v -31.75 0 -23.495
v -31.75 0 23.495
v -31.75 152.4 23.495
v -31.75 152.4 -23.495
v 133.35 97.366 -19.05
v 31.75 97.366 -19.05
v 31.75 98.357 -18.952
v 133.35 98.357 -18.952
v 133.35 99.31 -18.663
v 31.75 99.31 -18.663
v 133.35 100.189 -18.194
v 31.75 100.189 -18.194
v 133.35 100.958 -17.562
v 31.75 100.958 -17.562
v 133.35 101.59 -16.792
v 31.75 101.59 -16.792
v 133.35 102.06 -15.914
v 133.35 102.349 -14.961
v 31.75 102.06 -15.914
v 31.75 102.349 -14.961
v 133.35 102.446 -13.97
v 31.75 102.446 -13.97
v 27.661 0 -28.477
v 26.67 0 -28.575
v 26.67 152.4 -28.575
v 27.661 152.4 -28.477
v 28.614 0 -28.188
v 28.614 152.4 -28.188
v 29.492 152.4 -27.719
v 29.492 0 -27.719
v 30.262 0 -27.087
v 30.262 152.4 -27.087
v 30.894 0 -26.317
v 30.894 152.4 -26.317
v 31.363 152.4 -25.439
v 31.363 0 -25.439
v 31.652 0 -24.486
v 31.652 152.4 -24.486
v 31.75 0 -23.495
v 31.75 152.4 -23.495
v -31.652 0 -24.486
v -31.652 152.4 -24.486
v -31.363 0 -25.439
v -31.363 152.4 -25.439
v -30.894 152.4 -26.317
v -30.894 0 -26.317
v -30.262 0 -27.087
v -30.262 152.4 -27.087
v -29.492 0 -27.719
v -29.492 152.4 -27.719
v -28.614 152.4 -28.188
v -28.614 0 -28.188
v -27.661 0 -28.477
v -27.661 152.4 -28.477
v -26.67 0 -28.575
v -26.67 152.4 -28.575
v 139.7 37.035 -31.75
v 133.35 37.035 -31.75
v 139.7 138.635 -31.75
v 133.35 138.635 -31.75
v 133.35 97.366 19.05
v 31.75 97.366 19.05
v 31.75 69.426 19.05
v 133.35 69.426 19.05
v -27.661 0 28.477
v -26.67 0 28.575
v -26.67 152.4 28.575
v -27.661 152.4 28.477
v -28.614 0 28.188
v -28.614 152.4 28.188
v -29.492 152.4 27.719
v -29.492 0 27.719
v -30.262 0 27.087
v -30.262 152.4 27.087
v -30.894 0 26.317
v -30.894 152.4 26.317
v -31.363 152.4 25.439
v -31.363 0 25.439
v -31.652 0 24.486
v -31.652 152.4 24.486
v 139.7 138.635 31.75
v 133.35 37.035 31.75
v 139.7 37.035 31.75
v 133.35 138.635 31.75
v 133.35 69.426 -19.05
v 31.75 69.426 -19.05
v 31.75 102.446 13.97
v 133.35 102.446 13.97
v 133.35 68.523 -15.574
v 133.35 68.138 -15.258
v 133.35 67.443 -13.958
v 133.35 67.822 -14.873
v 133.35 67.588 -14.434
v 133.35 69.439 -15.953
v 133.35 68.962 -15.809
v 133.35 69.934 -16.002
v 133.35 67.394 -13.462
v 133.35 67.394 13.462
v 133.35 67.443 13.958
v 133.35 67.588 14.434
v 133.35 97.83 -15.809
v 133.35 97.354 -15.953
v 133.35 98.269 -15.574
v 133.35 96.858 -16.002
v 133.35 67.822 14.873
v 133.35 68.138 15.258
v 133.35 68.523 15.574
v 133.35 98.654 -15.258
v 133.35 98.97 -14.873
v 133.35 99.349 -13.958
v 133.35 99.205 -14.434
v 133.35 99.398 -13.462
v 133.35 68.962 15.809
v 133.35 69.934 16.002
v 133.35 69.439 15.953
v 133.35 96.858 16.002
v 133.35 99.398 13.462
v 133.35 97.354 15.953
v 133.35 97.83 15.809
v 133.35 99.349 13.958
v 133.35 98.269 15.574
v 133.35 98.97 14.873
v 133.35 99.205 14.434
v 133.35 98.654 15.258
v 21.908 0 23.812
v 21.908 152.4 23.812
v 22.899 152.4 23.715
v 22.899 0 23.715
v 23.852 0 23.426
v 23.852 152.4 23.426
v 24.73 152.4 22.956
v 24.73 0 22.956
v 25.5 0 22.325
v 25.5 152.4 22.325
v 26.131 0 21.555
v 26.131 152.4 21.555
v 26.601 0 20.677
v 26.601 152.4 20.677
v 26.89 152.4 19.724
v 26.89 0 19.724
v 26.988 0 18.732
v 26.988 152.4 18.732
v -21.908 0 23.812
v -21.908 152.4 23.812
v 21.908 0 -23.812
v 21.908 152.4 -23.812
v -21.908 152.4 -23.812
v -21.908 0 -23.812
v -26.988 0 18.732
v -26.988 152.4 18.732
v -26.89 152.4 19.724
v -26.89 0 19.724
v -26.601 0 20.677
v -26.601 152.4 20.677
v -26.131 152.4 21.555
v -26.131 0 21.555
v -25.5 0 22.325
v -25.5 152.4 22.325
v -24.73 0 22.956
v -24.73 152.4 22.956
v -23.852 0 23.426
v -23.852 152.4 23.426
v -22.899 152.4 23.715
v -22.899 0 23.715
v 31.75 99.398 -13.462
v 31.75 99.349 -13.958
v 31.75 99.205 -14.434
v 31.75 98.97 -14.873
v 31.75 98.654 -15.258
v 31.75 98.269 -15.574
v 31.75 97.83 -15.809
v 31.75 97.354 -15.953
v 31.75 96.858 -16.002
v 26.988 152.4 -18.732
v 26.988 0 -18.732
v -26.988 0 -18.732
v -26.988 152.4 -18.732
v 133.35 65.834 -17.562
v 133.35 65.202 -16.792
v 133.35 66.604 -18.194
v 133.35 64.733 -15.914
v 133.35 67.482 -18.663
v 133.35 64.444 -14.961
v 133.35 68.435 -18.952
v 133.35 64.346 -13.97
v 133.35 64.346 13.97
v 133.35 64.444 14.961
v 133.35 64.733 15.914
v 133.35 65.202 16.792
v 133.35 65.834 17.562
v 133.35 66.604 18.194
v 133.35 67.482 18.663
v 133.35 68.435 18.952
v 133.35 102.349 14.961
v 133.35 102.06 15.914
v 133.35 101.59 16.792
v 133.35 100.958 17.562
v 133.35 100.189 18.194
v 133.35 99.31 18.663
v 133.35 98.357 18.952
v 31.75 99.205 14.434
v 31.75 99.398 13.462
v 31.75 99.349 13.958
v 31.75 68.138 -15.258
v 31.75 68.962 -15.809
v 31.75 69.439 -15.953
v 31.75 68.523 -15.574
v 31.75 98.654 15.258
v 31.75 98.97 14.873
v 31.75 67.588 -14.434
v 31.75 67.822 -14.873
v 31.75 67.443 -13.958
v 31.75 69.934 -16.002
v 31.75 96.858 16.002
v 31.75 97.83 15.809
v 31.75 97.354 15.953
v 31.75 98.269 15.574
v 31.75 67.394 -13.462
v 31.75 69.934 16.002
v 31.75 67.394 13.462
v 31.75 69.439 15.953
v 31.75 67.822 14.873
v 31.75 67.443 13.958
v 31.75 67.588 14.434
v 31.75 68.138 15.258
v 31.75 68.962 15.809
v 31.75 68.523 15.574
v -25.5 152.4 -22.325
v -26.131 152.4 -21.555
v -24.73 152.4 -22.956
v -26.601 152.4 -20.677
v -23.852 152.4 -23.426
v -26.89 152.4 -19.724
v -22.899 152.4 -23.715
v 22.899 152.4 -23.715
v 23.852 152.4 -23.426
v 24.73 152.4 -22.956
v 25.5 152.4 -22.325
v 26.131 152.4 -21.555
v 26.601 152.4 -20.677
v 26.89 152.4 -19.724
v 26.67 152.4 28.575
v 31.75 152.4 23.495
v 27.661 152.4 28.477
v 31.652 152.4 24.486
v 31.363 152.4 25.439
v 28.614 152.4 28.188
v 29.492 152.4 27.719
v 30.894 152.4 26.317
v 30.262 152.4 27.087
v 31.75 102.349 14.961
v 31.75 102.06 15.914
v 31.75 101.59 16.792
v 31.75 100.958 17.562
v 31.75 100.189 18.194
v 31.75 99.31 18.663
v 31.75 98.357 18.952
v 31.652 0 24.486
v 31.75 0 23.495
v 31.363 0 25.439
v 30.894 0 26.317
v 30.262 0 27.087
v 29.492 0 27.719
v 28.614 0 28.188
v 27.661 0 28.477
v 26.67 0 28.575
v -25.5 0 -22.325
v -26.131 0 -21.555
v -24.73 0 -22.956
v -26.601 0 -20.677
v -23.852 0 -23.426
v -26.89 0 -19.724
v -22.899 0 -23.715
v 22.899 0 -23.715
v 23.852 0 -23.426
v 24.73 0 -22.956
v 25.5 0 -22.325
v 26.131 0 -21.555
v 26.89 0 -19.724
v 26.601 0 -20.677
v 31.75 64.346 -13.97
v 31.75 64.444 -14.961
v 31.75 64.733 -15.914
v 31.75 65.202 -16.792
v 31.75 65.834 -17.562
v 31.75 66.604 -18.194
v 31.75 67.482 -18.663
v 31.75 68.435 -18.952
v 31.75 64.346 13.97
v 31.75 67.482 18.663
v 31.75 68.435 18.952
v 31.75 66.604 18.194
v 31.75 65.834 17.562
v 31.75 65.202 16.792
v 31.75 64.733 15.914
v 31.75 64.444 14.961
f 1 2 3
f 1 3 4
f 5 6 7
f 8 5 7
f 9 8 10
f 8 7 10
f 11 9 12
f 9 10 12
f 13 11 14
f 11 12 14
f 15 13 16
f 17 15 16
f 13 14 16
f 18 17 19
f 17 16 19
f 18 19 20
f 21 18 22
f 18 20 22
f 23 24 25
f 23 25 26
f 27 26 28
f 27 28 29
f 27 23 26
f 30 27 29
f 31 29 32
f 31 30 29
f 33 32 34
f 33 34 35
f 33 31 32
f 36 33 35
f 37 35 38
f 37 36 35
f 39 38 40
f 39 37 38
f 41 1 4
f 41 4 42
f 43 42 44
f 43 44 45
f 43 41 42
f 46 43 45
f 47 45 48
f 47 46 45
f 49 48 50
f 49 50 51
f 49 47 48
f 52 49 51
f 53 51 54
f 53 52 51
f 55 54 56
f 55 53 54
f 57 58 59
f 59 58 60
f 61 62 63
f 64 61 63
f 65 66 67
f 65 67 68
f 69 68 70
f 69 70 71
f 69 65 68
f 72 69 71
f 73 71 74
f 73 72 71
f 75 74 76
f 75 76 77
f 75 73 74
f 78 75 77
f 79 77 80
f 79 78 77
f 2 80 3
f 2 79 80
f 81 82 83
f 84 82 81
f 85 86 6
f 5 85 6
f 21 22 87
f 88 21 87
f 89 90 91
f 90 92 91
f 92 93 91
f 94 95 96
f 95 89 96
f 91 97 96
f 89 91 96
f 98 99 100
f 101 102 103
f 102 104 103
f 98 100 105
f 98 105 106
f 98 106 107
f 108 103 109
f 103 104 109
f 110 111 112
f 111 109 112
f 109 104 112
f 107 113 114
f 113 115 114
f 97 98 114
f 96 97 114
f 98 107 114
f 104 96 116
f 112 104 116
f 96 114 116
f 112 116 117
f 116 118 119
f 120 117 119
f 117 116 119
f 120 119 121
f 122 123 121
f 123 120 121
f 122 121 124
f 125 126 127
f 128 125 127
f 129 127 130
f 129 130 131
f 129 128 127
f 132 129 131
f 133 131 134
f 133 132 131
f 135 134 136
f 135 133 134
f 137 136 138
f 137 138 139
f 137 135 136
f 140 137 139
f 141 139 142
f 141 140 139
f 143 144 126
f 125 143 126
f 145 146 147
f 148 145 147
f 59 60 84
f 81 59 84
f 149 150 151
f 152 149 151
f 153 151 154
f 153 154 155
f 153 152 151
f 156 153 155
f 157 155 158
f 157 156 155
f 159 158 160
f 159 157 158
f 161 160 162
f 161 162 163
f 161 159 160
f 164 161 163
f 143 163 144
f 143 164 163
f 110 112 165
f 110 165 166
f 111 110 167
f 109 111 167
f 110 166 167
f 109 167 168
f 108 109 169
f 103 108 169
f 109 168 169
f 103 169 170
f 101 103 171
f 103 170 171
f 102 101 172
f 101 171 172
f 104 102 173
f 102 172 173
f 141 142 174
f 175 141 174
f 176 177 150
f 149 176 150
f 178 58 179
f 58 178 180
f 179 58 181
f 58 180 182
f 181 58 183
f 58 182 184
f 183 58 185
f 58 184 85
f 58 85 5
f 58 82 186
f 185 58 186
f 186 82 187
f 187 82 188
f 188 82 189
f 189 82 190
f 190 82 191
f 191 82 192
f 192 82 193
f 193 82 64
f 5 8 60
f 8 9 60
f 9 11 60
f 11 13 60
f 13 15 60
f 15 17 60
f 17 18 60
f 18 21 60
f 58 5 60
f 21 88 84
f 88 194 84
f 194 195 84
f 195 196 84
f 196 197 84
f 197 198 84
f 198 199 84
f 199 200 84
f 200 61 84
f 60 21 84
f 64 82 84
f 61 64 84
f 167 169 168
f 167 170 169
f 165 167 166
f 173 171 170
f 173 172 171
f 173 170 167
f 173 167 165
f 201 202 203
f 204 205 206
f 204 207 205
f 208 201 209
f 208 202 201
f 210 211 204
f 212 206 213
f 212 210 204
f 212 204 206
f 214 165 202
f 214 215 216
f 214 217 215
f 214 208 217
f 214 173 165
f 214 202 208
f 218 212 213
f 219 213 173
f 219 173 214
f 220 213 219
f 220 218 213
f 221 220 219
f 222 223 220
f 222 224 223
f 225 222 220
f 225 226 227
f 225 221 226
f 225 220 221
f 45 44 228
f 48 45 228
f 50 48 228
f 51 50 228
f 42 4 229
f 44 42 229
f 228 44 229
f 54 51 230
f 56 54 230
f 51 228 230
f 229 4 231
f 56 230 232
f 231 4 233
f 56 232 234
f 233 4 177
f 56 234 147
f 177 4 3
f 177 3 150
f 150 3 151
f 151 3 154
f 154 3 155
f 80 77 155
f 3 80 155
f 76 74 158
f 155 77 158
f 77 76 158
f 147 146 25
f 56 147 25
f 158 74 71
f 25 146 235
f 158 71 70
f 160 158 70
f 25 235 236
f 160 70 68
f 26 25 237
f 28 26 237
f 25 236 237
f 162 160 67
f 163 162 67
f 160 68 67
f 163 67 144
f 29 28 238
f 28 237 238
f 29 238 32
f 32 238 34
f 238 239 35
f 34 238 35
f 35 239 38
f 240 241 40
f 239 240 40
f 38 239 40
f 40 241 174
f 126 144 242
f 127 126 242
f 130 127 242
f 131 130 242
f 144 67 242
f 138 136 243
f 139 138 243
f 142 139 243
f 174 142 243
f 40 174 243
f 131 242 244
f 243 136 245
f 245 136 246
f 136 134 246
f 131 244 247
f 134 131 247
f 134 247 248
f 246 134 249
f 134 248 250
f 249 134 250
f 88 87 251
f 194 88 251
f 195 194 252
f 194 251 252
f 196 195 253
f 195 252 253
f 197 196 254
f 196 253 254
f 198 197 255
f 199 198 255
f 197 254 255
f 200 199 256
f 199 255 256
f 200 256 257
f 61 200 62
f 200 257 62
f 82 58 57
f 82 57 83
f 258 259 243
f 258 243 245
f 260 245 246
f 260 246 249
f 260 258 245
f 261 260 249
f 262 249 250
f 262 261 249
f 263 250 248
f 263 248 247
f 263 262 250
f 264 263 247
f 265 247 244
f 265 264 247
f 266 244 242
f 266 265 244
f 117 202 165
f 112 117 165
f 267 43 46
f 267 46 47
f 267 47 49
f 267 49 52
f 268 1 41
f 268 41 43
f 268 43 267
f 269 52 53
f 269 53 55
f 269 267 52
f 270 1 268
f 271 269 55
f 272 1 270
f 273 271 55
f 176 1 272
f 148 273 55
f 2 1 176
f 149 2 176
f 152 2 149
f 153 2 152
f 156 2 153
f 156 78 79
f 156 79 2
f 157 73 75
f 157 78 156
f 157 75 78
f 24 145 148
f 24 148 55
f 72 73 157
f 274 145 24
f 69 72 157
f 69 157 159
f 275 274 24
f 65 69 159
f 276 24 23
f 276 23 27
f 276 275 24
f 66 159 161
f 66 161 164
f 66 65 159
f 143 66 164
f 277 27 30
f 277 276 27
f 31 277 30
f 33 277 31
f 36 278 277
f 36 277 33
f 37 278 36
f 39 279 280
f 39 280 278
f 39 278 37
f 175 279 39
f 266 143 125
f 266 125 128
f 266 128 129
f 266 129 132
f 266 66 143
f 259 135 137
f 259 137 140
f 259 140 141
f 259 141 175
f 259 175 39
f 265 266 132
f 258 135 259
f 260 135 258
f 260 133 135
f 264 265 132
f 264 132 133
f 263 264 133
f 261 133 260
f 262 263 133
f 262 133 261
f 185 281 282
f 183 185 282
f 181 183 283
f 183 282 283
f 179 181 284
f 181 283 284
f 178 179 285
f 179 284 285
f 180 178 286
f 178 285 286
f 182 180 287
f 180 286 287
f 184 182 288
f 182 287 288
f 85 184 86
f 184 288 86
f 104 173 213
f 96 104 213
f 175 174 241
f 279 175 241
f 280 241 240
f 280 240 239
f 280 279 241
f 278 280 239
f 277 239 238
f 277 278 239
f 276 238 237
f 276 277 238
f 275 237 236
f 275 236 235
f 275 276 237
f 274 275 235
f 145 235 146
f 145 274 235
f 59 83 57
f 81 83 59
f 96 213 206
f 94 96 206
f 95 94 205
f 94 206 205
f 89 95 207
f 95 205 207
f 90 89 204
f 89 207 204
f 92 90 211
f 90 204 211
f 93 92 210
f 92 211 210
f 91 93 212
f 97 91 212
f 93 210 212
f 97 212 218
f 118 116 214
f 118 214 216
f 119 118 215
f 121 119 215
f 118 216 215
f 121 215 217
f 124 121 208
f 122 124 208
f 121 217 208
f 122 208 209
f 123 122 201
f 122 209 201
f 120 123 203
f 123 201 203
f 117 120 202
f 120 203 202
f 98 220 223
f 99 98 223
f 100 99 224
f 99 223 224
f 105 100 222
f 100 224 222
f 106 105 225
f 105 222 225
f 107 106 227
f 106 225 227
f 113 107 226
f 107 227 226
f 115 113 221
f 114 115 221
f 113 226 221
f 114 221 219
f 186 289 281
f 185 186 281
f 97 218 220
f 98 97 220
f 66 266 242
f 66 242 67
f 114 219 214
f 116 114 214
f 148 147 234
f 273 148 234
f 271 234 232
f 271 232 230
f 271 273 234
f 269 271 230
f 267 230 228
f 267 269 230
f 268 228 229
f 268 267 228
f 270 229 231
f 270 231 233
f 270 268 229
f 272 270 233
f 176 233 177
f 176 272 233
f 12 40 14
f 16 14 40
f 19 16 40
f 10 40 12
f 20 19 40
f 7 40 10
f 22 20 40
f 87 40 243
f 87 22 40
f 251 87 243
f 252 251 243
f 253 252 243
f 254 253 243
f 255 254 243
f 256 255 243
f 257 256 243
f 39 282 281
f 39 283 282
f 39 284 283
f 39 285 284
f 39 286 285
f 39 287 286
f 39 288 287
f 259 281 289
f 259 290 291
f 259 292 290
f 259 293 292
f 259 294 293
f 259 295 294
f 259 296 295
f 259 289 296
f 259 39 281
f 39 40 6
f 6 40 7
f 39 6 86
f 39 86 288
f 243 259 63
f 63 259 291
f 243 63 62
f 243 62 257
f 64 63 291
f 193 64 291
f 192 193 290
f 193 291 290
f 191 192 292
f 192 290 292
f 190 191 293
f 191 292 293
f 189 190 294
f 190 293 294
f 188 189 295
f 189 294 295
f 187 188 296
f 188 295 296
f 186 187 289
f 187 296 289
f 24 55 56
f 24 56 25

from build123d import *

# Parameters (mm, degrees)
F1_DEPTH = 152.4
F3_DEPTH = 101.6
F5_W     = 101.6
F5_H     = 63.5
F6_DEPTH = 6.35


with BuildPart() as f1:
    # F0 (on Front) → F1 (new body)
    with BuildSketch(Plane.XZ):
        with BuildLine():
            Line((-26.67, -28.575), (26.67, -28.575))
            ThreePointArc((26.67, -28.575), (30.2621024484, -27.0871024484), (31.75, -23.495))
            Line((31.75, -23.495), (31.75, 23.495))
            ThreePointArc((31.75, 23.495), (30.2621024484, 27.0871024484), (26.67, 28.575))
            Line((26.67, 28.575), (-26.67, 28.575))
            ThreePointArc((-26.67, 28.575), (-30.2621024484, 27.0871024484), (-31.75, 23.495))
            Line((-31.75, 23.495), (-31.75, -23.495))
            ThreePointArc((-31.75, -23.495), (-30.2621024484, -27.0871024484), (-26.67, -28.575))
        make_face()
        with BuildLine():
            Line((-21.9075, 23.8125), (21.9075, 23.8125))
            ThreePointArc((21.9075, 23.8125), (25.4996024484, 22.3246024484), (26.9875, 18.7325))
            Line((26.9875, 18.7325), (26.9875, -18.7325))
            ThreePointArc((26.9875, -18.7325), (25.4996024484, -22.3246024484), (21.9075, -23.8125))
            Line((21.9075, -23.8125), (-21.9075, -23.8125))
            ThreePointArc((-21.9075, -23.8125), (-25.4996024484, -22.3246024484), (-26.9875, -18.7325))
            Line((-26.9875, -18.7325), (-26.9875, 18.7325))
            ThreePointArc((-26.9875, 18.7325), (-25.4996024484, 22.3246024484), (-21.9075, 23.8125))
        make_face(mode=Mode.SUBTRACT)
    extrude(amount=-F1_DEPTH)

    # F2 (on face) → F3 (join)
    with BuildSketch(Plane.YZ.offset(31.75)):
        with BuildLine():
            Line((69.4262681528, -19.05), (97.3662681528, -19.05))
            ThreePointArc((97.3662681528, -19.05), (100.9583706013, -17.5621024484), (102.4462681528, -13.97))
            Line((102.4462681528, -13.97), (102.4462681528, 13.97))
            ThreePointArc((102.4462681528, 13.97), (100.9583706013, 17.5621024484), (97.3662681528, 19.05))
            Line((97.3662681528, 19.05), (69.4262681528, 19.05))
            ThreePointArc((69.4262681528, 19.05), (65.8341657044, 17.5621024484), (64.3462681528, 13.97))
            Line((64.3462681528, 13.97), (64.3462681528, -13.97))
            ThreePointArc((64.3462681528, -13.97), (65.8341657044, -17.5621024484), (69.4262681528, -19.05))
        make_face()
        with BuildLine():
            ThreePointArc((69.9342681528, -16.002), (68.1382169286, -15.2580512242), (67.3942681528, -13.462))
            Line((67.3942681528, -13.462), (67.3942681528, 13.462))
            ThreePointArc((67.3942681528, 13.462), (68.1382169286, 15.2580512242), (69.9342681528, 16.002))
            Line((69.9342681528, 16.002), (96.8582681528, 16.002))
            ThreePointArc((96.8582681528, 16.002), (98.6543193771, 15.2580512242), (99.3982681528, 13.462))
            Line((99.3982681528, 13.462), (99.3982681528, -13.462))
            ThreePointArc((99.3982681528, -13.462), (98.6543193771, -15.2580512242), (96.8582681528, -16.002))
            Line((96.8582681528, -16.002), (69.9342681528, -16.002))
        make_face(mode=Mode.SUBTRACT)
    extrude(amount=F3_DEPTH)

    # F4 (on face) + F5 (on face) → F6 (join)
    with BuildSketch(Plane.YZ.offset(133.35)):
        with BuildLine():
            ThreePointArc((64.3462681528, -13.97), (65.8341657044, -17.5621024484), (69.4262681528, -19.05))
            Line((69.4262681528, -19.05), (97.3662681528, -19.05))
            ThreePointArc((97.3662681528, -19.05), (100.9583706013, -17.5621024484), (102.4462681528, -13.97))
            Line((102.4462681528, -13.97), (102.4462681528, 13.97))
            ThreePointArc((102.4462681528, 13.97), (100.9583706013, 17.5621024484), (97.3662681528, 19.05))
            Line((97.3662681528, 19.05), (69.4262681528, 19.05))
            ThreePointArc((69.4262681528, 19.05), (65.8341657044, 17.5621024484), (64.3462681528, 13.97))
            Line((64.3462681528, 13.97), (64.3462681528, -13.97))
        make_face()
        with BuildLine():
            ThreePointArc((99.3982681528, -13.462), (98.6543193771, -15.2580512242), (96.8582681528, -16.002))
            Line((96.8582681528, -16.002), (69.9342681528, -16.002))
            ThreePointArc((69.9342681528, -16.002), (68.1382169286, -15.2580512242), (67.3942681528, -13.462))
            Line((67.3942681528, -13.462), (67.3942681528, 13.462))
            ThreePointArc((67.3942681528, 13.462), (68.1382169286, 15.2580512242), (69.9342681528, 16.002))
            Line((69.9342681528, 16.002), (96.8582681528, 16.002))
            ThreePointArc((96.8582681528, 16.002), (98.6543193771, 15.2580512242), (99.3982681528, 13.462))
            Line((99.3982681528, 13.462), (99.3982681528, -13.462))
        make_face(mode=Mode.SUBTRACT)
        with BuildLine():
            Line((69.9342681528, -16.002), (96.8582681528, -16.002))
            ThreePointArc((96.8582681528, -16.002), (98.6543193771, -15.2580512242), (99.3982681528, -13.462))
            Line((99.3982681528, -13.462), (99.3982681528, 13.462))
            ThreePointArc((99.3982681528, 13.462), (98.6543193771, 15.2580512242), (96.8582681528, 16.002))
            Line((96.8582681528, 16.002), (69.9342681528, 16.002))
            ThreePointArc((69.9342681528, 16.002), (68.1382169286, 15.2580512242), (67.3942681528, 13.462))
            Line((67.3942681528, 13.462), (67.3942681528, -13.462))
            ThreePointArc((67.3942681528, -13.462), (68.1382169286, -15.2580512242), (69.9342681528, -16.002))
        make_face()
    with BuildSketch(Plane.YZ.offset(133.35)):
        with Locations((87.8347480977, 0)):
            Rectangle(F5_W, F5_H)
        with BuildLine():
            ThreePointArc((102.4462681528, -13.97), (100.9583706013, -17.5621024484), (97.3662681528, -19.05))
            Line((97.3662681528, -19.05), (69.4262681528, -19.05))
            ThreePointArc((69.4262681528, -19.05), (65.8341657044, -17.5621024484), (64.3462681528, -13.97))
            Line((64.3462681528, -13.97), (64.3462681528, 13.97))
            ThreePointArc((64.3462681528, 13.97), (65.8341657044, 17.5621024484), (69.4262681528, 19.05))
            Line((69.4262681528, 19.05), (97.3662681528, 19.05))
            ThreePointArc((97.3662681528, 19.05), (100.9583706013, 17.5621024484), (102.4462681528, 13.97))
            Line((102.4462681528, 13.97), (102.4462681528, -13.97))
        make_face(mode=Mode.SUBTRACT)
    extrude(amount=F6_DEPTH)


solid = f1.part
